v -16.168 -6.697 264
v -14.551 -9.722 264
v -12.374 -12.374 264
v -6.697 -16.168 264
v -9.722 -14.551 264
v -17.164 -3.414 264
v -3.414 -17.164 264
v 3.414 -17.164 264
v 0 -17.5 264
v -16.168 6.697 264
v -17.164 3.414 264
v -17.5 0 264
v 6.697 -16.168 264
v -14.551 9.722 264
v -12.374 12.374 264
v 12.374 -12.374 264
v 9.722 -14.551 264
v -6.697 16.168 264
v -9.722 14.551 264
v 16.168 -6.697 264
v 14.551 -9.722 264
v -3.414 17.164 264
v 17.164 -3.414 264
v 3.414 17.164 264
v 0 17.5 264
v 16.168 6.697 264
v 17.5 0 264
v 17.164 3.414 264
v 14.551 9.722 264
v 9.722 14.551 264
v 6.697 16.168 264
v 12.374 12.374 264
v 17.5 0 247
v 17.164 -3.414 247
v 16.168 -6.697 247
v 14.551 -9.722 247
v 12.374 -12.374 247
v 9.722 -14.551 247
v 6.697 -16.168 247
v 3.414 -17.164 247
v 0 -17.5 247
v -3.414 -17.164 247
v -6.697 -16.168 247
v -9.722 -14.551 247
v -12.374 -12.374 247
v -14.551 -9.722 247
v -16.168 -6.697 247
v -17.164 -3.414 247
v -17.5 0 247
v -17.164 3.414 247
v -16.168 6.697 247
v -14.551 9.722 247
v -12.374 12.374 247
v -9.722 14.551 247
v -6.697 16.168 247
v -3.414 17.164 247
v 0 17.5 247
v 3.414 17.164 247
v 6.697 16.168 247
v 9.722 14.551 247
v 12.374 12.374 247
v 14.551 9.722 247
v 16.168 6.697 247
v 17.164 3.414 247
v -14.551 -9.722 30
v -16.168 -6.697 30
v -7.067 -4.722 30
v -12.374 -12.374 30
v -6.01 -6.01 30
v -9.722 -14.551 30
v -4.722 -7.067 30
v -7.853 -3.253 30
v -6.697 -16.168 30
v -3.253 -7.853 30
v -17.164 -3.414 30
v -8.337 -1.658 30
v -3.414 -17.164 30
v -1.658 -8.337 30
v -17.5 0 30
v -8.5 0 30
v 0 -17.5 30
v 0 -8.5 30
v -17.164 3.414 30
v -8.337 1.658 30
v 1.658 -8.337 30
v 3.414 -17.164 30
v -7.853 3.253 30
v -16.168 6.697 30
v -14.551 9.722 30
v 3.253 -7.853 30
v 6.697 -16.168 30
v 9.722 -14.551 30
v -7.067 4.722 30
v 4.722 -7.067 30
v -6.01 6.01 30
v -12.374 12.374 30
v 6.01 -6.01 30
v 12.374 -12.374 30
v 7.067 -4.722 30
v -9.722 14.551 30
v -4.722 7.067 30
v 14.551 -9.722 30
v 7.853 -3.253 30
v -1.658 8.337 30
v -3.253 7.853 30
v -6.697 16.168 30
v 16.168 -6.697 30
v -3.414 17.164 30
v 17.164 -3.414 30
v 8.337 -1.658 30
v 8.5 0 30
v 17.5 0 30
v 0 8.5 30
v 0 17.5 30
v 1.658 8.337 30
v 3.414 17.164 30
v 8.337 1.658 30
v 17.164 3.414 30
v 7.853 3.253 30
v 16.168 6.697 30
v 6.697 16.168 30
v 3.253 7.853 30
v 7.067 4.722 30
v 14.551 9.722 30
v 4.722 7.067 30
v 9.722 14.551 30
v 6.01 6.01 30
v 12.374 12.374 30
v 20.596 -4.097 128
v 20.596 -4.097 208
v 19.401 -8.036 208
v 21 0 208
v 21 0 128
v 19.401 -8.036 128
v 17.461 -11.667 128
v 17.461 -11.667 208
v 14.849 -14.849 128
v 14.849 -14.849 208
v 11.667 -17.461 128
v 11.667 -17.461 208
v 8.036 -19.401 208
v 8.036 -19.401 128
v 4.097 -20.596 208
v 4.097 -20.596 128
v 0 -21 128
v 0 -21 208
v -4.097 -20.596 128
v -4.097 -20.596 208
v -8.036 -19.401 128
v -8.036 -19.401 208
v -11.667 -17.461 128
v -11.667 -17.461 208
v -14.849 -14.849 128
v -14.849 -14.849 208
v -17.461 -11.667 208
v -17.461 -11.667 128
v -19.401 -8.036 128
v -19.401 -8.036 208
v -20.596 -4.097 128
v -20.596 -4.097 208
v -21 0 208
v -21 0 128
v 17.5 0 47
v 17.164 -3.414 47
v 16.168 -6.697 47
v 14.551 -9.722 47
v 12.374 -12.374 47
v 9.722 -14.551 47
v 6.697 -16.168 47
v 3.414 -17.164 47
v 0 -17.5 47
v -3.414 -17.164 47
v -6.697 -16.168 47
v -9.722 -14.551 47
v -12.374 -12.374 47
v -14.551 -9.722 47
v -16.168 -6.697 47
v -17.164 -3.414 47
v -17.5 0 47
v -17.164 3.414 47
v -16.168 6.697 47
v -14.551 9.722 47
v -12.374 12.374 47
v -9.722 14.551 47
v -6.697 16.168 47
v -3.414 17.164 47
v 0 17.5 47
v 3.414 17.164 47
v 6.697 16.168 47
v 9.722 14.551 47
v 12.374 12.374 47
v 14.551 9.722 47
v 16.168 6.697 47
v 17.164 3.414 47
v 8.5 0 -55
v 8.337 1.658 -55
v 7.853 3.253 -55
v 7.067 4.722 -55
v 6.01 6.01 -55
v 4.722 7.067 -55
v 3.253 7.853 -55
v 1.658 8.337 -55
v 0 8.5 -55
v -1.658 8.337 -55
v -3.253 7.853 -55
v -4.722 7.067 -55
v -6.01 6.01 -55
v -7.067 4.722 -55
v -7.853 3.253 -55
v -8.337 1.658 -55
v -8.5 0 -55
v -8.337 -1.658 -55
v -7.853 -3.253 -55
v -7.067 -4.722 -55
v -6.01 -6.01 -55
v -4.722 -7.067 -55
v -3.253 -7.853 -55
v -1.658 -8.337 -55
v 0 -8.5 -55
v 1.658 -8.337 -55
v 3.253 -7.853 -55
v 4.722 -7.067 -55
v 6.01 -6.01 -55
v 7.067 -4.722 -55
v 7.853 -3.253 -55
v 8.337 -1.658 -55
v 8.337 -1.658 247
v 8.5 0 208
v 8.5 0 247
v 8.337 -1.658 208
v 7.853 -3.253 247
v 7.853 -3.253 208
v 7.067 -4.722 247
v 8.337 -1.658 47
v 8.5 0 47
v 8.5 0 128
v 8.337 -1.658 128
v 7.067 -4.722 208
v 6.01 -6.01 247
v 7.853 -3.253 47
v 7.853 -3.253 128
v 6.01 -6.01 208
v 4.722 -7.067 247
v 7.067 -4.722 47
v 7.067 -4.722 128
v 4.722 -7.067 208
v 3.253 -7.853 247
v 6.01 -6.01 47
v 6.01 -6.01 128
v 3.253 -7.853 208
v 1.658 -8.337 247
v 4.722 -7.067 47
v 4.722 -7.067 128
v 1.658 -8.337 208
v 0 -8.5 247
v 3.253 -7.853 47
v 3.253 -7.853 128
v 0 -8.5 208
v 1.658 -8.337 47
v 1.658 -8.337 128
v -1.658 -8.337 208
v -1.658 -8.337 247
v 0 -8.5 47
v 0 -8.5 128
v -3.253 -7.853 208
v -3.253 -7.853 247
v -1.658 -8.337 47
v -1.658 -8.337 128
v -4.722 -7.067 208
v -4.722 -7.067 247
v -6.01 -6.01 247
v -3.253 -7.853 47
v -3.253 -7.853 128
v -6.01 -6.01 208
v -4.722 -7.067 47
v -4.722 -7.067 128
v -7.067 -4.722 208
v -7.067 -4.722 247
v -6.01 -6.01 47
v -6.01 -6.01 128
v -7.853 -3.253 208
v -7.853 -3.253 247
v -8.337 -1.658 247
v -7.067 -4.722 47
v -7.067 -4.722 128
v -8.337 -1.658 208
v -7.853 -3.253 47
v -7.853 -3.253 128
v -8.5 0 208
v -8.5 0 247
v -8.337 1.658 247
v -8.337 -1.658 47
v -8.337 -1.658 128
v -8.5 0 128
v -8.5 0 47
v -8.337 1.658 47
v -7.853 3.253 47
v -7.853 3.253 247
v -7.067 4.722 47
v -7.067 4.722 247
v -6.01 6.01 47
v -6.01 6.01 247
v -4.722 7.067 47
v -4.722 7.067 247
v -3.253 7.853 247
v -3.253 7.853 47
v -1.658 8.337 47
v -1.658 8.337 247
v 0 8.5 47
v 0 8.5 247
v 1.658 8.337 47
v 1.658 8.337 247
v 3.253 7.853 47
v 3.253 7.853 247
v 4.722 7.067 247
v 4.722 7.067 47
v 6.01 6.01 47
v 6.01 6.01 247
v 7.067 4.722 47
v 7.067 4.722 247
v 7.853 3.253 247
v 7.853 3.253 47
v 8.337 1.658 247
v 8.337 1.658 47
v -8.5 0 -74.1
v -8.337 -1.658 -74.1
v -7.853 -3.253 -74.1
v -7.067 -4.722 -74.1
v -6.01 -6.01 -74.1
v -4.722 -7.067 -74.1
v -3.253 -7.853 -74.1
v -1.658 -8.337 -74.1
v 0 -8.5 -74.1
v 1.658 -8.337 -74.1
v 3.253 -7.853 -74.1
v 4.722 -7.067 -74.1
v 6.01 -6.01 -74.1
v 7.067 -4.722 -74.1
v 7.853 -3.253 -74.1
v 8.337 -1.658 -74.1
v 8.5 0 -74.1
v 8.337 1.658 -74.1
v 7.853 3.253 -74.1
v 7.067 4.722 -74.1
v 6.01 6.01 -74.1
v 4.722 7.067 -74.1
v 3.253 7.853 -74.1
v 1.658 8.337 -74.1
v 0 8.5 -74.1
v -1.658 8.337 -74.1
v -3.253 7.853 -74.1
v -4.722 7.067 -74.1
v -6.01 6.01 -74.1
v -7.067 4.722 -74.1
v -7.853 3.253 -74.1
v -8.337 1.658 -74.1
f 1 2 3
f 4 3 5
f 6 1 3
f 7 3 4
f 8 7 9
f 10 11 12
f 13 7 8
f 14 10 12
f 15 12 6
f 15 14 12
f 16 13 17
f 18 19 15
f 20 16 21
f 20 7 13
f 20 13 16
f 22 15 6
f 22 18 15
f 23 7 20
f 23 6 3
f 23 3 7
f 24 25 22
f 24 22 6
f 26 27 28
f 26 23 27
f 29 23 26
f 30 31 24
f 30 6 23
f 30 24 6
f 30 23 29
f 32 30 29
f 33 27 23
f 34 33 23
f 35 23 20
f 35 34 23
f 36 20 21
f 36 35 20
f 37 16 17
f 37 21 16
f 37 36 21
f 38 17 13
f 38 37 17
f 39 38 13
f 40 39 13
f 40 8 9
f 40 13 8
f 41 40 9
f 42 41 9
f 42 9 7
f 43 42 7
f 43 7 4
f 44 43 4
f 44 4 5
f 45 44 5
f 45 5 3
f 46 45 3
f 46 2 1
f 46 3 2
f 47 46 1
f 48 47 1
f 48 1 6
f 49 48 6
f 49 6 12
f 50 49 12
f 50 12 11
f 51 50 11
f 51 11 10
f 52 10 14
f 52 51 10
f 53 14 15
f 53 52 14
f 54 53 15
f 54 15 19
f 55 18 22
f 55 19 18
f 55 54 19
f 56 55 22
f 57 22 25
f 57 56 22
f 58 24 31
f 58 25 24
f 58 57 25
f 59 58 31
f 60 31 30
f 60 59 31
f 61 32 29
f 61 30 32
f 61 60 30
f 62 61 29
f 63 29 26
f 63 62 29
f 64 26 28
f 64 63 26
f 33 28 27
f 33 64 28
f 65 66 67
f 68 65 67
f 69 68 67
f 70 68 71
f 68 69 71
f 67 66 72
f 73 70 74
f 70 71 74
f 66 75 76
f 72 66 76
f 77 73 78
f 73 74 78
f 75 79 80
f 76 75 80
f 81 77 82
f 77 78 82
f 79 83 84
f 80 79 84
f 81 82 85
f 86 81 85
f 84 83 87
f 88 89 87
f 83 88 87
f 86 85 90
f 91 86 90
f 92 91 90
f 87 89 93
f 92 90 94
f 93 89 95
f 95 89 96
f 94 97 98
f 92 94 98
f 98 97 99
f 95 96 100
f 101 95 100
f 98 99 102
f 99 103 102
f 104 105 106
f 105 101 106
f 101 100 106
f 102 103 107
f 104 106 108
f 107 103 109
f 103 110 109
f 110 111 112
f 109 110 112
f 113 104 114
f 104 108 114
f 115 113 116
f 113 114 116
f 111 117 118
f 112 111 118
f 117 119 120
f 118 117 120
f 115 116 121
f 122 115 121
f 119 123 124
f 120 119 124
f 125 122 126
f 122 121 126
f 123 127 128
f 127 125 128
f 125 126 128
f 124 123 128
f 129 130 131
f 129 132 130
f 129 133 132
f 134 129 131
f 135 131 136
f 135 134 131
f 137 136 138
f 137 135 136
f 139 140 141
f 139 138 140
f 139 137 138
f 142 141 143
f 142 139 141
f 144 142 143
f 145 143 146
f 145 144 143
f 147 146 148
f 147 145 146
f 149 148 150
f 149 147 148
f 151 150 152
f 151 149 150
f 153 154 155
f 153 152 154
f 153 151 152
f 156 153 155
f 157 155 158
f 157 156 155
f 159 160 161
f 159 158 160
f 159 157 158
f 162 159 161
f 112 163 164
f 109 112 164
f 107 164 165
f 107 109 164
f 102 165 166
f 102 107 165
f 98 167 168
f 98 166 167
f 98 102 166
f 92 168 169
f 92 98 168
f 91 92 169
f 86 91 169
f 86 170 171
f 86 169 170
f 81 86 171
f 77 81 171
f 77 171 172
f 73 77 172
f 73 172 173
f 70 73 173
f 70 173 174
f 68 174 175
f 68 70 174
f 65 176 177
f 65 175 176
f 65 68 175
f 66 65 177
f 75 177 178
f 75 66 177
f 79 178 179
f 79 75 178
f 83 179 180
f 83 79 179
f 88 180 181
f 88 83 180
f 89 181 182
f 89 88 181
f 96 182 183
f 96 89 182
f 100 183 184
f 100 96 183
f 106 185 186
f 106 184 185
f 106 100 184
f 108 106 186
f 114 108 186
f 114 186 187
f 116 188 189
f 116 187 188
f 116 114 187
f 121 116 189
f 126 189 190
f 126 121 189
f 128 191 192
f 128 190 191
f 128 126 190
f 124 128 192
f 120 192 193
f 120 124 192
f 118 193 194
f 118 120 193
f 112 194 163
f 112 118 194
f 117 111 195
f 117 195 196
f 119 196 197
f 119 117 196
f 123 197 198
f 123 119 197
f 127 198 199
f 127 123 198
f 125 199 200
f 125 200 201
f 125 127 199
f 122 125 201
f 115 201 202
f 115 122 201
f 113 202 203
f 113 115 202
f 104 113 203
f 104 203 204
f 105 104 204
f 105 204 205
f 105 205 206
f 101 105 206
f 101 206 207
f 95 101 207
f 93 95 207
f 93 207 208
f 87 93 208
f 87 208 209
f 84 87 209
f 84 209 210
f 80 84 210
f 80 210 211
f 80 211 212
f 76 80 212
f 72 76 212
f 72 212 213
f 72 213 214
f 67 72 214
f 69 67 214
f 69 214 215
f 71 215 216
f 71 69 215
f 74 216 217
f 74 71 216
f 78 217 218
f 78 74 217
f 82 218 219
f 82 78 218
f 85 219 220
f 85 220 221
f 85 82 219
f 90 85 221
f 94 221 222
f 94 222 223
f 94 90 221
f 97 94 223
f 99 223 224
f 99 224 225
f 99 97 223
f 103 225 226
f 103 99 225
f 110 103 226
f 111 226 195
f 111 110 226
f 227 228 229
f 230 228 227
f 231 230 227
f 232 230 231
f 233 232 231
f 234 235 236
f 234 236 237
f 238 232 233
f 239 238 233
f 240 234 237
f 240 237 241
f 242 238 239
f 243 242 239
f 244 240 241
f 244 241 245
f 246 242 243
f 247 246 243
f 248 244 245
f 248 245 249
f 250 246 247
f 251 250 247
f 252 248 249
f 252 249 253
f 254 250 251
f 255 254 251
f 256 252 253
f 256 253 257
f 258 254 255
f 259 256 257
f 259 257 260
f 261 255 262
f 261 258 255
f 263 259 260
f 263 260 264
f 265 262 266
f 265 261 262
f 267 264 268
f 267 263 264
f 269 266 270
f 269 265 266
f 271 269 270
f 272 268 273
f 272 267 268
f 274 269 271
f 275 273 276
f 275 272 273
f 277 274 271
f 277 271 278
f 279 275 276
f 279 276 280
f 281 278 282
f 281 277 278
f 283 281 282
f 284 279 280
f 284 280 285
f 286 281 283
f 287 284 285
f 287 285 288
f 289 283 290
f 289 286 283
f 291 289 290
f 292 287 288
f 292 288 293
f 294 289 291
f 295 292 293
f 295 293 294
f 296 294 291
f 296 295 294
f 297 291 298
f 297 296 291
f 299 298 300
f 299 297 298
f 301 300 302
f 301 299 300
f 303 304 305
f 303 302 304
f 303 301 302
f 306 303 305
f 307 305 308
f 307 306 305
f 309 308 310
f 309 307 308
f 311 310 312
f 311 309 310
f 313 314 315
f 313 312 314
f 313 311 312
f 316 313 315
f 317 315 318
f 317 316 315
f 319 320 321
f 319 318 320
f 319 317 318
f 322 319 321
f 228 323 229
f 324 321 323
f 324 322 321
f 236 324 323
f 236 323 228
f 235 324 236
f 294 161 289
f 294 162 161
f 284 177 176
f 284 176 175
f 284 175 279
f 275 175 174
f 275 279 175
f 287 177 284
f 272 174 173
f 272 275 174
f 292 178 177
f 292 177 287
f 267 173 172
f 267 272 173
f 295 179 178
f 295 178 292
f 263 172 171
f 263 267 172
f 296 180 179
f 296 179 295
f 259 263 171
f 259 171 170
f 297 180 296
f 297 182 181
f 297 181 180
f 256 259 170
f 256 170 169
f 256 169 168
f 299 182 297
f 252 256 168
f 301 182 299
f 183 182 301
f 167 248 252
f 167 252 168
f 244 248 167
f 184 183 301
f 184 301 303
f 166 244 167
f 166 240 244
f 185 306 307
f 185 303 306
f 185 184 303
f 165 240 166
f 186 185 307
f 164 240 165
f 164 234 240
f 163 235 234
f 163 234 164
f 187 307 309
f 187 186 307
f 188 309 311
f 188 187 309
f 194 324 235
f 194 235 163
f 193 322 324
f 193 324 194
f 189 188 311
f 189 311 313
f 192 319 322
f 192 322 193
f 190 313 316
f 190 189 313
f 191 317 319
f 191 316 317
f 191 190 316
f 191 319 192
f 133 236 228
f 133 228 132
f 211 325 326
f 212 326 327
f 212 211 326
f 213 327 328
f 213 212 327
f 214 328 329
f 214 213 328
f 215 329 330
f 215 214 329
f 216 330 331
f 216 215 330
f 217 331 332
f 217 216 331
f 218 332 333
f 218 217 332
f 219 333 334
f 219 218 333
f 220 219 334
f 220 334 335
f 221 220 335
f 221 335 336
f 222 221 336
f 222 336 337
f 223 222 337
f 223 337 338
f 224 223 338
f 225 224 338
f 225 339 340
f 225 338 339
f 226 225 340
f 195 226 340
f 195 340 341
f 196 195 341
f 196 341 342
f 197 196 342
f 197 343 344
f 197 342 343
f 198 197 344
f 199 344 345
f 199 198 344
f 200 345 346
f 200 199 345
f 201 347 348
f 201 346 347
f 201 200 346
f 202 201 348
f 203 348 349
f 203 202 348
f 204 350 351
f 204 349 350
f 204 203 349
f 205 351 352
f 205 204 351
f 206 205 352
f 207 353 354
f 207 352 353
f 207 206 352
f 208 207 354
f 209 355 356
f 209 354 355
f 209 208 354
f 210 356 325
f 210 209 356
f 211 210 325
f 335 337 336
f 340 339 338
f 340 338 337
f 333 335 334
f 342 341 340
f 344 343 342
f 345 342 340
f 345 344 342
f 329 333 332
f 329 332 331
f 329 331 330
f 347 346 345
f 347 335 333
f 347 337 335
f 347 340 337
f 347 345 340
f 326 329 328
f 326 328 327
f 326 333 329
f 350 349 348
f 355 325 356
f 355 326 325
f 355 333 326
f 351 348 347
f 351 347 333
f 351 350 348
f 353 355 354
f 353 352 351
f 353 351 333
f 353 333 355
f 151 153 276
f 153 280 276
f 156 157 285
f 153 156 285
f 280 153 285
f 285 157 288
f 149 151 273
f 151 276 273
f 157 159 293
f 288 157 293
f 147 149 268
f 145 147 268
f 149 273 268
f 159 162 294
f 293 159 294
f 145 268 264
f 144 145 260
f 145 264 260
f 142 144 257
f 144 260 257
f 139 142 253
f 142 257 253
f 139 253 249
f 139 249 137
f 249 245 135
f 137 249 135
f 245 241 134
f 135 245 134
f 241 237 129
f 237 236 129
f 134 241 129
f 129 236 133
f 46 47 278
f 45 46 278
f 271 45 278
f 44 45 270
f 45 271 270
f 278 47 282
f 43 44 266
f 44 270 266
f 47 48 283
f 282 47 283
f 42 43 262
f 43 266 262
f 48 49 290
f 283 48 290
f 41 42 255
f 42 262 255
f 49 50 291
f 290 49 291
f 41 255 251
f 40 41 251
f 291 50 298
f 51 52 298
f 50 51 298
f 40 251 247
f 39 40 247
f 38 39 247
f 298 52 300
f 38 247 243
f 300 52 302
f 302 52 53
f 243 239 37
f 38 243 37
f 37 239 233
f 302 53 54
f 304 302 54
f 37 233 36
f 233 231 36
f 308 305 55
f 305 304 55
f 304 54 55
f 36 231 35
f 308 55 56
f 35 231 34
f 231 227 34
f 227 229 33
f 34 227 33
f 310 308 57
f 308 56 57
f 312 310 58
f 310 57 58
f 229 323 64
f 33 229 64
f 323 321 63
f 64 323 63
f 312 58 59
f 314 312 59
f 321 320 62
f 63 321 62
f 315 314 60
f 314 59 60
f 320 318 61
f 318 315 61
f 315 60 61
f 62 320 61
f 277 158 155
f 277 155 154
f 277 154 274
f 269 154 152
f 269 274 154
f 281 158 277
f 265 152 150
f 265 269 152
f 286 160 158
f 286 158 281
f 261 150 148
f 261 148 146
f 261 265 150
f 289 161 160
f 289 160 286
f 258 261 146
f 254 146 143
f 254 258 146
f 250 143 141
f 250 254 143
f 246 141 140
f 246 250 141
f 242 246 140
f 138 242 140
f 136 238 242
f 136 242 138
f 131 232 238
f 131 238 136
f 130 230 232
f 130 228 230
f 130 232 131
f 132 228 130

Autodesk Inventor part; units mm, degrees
ref_plane "YZ Plane" through (0, 0, 0) normal (1, 0, 0) x (0, 1, 0)
ref_plane "XZ Plane" through (0, 0, 0) normal (0, 1, 0) x (-1, 0, 0)
ref_plane "XY Plane" through (0, 0, 0) normal (0, 0, 1) x (1, 0, 0)
sketch "Эскиз1" plane through (0, 0, 0) normal (0, 0, 1) x (1, 0, 0)
  circle A0 centre (0, 0) radius 8.5
  dimension "d1" = 17
extrude "Выдавливание1" add sketch "Эскиз1" against normal blind 55
sketch "Эскиз2" plane through (0, 0, 0) normal (0, 0, 1) x (1, 0, 0)
  circle A0 centre (0, 0) radius 8.5
  dimension "d10" = 17
extrude "Выдавливание2" add sketch "Эскиз2" along normal blind 30
sketch "Эскиз3" plane through (0, 0, 30) normal (0, 0, 1) x (1, 0, 0)
  circle A0 centre (0, 0) radius 17.5
  dimension "d7" = 35
extrude "Выдавливание3" add sketch "Эскиз3" along normal blind 17
sketch "Эскиз4" plane through (0, 0, 47) normal (0, 0, 1) x (1, 0, 0)
  circle A0 centre (0, 0) radius 8.5
  line L0 (8.5, 0) -> (20, 0) projected
  point P0 (-16, 0)
  dimension "d25" = 17
extrude "Выдавливание4" add sketch "Эскиз4" along normal blind 15
sketch "Эскиз6" plane through (0, 0, 62) normal (0, 0, 1) x (1, 0, 0)
  circle A0 centre (0, 0) radius 8.5
  point P0 (-16, 0)
  point P1 (20, 0)
  dimension "d24" = 17
extrude "Выдавливание5" add sketch "Эскиз6" along normal blind 55
sketch "Эскиз7" plane through (0, 0, 117) normal (0, 0, 1) x (1, 0, 0)
  circle A0 centre (0, 0) radius 8.5
  dimension "d26" = 17
extrude "Выдавливание6" add sketch "Эскиз7" along normal blind 130
sketch "Эскиз8" plane through (0, 0, 247) normal (0, 0, 1) x (1, 0, 0)
  circle A0 centre (0, 0) radius 17.5
  dimension "d23" = 35
extrude "Выдавливание7" add sketch "Эскиз8" along normal blind 17
sketch "Эскиз9" plane through (0, 0, -55) normal (0, 0, -1) x (-1, 0, 0)
  circle A0 centre (0, 0) radius 8.5
extrude "Выдавливание8" add sketch "Эскиз9" along normal blind 19.1
ref_plane "РабПлоскость1" through (0, 0, 168) normal (0, 0, 1) x (1, 0, 0)
sketch "Эскиз10" plane through (0, 0, 168) normal (0, 0, 1) x (1, 0, 0)
  circle A0 centre (0, 0) radius 8.5
  circle A1 centre (0, 0) radius 21
  line L0 (-21, 0) -> (21, 0)
  point P0 (-8.5, 0)
  point P1 (8.5, 0)
  dimension "d30" = 42
extrude "Выдавливание9" add sketch "Эскиз10" along normal mid plane 80 contours L0 A1 A0 picked at (16.6299, -1.6752)
properties part number "балансирный_вал"
